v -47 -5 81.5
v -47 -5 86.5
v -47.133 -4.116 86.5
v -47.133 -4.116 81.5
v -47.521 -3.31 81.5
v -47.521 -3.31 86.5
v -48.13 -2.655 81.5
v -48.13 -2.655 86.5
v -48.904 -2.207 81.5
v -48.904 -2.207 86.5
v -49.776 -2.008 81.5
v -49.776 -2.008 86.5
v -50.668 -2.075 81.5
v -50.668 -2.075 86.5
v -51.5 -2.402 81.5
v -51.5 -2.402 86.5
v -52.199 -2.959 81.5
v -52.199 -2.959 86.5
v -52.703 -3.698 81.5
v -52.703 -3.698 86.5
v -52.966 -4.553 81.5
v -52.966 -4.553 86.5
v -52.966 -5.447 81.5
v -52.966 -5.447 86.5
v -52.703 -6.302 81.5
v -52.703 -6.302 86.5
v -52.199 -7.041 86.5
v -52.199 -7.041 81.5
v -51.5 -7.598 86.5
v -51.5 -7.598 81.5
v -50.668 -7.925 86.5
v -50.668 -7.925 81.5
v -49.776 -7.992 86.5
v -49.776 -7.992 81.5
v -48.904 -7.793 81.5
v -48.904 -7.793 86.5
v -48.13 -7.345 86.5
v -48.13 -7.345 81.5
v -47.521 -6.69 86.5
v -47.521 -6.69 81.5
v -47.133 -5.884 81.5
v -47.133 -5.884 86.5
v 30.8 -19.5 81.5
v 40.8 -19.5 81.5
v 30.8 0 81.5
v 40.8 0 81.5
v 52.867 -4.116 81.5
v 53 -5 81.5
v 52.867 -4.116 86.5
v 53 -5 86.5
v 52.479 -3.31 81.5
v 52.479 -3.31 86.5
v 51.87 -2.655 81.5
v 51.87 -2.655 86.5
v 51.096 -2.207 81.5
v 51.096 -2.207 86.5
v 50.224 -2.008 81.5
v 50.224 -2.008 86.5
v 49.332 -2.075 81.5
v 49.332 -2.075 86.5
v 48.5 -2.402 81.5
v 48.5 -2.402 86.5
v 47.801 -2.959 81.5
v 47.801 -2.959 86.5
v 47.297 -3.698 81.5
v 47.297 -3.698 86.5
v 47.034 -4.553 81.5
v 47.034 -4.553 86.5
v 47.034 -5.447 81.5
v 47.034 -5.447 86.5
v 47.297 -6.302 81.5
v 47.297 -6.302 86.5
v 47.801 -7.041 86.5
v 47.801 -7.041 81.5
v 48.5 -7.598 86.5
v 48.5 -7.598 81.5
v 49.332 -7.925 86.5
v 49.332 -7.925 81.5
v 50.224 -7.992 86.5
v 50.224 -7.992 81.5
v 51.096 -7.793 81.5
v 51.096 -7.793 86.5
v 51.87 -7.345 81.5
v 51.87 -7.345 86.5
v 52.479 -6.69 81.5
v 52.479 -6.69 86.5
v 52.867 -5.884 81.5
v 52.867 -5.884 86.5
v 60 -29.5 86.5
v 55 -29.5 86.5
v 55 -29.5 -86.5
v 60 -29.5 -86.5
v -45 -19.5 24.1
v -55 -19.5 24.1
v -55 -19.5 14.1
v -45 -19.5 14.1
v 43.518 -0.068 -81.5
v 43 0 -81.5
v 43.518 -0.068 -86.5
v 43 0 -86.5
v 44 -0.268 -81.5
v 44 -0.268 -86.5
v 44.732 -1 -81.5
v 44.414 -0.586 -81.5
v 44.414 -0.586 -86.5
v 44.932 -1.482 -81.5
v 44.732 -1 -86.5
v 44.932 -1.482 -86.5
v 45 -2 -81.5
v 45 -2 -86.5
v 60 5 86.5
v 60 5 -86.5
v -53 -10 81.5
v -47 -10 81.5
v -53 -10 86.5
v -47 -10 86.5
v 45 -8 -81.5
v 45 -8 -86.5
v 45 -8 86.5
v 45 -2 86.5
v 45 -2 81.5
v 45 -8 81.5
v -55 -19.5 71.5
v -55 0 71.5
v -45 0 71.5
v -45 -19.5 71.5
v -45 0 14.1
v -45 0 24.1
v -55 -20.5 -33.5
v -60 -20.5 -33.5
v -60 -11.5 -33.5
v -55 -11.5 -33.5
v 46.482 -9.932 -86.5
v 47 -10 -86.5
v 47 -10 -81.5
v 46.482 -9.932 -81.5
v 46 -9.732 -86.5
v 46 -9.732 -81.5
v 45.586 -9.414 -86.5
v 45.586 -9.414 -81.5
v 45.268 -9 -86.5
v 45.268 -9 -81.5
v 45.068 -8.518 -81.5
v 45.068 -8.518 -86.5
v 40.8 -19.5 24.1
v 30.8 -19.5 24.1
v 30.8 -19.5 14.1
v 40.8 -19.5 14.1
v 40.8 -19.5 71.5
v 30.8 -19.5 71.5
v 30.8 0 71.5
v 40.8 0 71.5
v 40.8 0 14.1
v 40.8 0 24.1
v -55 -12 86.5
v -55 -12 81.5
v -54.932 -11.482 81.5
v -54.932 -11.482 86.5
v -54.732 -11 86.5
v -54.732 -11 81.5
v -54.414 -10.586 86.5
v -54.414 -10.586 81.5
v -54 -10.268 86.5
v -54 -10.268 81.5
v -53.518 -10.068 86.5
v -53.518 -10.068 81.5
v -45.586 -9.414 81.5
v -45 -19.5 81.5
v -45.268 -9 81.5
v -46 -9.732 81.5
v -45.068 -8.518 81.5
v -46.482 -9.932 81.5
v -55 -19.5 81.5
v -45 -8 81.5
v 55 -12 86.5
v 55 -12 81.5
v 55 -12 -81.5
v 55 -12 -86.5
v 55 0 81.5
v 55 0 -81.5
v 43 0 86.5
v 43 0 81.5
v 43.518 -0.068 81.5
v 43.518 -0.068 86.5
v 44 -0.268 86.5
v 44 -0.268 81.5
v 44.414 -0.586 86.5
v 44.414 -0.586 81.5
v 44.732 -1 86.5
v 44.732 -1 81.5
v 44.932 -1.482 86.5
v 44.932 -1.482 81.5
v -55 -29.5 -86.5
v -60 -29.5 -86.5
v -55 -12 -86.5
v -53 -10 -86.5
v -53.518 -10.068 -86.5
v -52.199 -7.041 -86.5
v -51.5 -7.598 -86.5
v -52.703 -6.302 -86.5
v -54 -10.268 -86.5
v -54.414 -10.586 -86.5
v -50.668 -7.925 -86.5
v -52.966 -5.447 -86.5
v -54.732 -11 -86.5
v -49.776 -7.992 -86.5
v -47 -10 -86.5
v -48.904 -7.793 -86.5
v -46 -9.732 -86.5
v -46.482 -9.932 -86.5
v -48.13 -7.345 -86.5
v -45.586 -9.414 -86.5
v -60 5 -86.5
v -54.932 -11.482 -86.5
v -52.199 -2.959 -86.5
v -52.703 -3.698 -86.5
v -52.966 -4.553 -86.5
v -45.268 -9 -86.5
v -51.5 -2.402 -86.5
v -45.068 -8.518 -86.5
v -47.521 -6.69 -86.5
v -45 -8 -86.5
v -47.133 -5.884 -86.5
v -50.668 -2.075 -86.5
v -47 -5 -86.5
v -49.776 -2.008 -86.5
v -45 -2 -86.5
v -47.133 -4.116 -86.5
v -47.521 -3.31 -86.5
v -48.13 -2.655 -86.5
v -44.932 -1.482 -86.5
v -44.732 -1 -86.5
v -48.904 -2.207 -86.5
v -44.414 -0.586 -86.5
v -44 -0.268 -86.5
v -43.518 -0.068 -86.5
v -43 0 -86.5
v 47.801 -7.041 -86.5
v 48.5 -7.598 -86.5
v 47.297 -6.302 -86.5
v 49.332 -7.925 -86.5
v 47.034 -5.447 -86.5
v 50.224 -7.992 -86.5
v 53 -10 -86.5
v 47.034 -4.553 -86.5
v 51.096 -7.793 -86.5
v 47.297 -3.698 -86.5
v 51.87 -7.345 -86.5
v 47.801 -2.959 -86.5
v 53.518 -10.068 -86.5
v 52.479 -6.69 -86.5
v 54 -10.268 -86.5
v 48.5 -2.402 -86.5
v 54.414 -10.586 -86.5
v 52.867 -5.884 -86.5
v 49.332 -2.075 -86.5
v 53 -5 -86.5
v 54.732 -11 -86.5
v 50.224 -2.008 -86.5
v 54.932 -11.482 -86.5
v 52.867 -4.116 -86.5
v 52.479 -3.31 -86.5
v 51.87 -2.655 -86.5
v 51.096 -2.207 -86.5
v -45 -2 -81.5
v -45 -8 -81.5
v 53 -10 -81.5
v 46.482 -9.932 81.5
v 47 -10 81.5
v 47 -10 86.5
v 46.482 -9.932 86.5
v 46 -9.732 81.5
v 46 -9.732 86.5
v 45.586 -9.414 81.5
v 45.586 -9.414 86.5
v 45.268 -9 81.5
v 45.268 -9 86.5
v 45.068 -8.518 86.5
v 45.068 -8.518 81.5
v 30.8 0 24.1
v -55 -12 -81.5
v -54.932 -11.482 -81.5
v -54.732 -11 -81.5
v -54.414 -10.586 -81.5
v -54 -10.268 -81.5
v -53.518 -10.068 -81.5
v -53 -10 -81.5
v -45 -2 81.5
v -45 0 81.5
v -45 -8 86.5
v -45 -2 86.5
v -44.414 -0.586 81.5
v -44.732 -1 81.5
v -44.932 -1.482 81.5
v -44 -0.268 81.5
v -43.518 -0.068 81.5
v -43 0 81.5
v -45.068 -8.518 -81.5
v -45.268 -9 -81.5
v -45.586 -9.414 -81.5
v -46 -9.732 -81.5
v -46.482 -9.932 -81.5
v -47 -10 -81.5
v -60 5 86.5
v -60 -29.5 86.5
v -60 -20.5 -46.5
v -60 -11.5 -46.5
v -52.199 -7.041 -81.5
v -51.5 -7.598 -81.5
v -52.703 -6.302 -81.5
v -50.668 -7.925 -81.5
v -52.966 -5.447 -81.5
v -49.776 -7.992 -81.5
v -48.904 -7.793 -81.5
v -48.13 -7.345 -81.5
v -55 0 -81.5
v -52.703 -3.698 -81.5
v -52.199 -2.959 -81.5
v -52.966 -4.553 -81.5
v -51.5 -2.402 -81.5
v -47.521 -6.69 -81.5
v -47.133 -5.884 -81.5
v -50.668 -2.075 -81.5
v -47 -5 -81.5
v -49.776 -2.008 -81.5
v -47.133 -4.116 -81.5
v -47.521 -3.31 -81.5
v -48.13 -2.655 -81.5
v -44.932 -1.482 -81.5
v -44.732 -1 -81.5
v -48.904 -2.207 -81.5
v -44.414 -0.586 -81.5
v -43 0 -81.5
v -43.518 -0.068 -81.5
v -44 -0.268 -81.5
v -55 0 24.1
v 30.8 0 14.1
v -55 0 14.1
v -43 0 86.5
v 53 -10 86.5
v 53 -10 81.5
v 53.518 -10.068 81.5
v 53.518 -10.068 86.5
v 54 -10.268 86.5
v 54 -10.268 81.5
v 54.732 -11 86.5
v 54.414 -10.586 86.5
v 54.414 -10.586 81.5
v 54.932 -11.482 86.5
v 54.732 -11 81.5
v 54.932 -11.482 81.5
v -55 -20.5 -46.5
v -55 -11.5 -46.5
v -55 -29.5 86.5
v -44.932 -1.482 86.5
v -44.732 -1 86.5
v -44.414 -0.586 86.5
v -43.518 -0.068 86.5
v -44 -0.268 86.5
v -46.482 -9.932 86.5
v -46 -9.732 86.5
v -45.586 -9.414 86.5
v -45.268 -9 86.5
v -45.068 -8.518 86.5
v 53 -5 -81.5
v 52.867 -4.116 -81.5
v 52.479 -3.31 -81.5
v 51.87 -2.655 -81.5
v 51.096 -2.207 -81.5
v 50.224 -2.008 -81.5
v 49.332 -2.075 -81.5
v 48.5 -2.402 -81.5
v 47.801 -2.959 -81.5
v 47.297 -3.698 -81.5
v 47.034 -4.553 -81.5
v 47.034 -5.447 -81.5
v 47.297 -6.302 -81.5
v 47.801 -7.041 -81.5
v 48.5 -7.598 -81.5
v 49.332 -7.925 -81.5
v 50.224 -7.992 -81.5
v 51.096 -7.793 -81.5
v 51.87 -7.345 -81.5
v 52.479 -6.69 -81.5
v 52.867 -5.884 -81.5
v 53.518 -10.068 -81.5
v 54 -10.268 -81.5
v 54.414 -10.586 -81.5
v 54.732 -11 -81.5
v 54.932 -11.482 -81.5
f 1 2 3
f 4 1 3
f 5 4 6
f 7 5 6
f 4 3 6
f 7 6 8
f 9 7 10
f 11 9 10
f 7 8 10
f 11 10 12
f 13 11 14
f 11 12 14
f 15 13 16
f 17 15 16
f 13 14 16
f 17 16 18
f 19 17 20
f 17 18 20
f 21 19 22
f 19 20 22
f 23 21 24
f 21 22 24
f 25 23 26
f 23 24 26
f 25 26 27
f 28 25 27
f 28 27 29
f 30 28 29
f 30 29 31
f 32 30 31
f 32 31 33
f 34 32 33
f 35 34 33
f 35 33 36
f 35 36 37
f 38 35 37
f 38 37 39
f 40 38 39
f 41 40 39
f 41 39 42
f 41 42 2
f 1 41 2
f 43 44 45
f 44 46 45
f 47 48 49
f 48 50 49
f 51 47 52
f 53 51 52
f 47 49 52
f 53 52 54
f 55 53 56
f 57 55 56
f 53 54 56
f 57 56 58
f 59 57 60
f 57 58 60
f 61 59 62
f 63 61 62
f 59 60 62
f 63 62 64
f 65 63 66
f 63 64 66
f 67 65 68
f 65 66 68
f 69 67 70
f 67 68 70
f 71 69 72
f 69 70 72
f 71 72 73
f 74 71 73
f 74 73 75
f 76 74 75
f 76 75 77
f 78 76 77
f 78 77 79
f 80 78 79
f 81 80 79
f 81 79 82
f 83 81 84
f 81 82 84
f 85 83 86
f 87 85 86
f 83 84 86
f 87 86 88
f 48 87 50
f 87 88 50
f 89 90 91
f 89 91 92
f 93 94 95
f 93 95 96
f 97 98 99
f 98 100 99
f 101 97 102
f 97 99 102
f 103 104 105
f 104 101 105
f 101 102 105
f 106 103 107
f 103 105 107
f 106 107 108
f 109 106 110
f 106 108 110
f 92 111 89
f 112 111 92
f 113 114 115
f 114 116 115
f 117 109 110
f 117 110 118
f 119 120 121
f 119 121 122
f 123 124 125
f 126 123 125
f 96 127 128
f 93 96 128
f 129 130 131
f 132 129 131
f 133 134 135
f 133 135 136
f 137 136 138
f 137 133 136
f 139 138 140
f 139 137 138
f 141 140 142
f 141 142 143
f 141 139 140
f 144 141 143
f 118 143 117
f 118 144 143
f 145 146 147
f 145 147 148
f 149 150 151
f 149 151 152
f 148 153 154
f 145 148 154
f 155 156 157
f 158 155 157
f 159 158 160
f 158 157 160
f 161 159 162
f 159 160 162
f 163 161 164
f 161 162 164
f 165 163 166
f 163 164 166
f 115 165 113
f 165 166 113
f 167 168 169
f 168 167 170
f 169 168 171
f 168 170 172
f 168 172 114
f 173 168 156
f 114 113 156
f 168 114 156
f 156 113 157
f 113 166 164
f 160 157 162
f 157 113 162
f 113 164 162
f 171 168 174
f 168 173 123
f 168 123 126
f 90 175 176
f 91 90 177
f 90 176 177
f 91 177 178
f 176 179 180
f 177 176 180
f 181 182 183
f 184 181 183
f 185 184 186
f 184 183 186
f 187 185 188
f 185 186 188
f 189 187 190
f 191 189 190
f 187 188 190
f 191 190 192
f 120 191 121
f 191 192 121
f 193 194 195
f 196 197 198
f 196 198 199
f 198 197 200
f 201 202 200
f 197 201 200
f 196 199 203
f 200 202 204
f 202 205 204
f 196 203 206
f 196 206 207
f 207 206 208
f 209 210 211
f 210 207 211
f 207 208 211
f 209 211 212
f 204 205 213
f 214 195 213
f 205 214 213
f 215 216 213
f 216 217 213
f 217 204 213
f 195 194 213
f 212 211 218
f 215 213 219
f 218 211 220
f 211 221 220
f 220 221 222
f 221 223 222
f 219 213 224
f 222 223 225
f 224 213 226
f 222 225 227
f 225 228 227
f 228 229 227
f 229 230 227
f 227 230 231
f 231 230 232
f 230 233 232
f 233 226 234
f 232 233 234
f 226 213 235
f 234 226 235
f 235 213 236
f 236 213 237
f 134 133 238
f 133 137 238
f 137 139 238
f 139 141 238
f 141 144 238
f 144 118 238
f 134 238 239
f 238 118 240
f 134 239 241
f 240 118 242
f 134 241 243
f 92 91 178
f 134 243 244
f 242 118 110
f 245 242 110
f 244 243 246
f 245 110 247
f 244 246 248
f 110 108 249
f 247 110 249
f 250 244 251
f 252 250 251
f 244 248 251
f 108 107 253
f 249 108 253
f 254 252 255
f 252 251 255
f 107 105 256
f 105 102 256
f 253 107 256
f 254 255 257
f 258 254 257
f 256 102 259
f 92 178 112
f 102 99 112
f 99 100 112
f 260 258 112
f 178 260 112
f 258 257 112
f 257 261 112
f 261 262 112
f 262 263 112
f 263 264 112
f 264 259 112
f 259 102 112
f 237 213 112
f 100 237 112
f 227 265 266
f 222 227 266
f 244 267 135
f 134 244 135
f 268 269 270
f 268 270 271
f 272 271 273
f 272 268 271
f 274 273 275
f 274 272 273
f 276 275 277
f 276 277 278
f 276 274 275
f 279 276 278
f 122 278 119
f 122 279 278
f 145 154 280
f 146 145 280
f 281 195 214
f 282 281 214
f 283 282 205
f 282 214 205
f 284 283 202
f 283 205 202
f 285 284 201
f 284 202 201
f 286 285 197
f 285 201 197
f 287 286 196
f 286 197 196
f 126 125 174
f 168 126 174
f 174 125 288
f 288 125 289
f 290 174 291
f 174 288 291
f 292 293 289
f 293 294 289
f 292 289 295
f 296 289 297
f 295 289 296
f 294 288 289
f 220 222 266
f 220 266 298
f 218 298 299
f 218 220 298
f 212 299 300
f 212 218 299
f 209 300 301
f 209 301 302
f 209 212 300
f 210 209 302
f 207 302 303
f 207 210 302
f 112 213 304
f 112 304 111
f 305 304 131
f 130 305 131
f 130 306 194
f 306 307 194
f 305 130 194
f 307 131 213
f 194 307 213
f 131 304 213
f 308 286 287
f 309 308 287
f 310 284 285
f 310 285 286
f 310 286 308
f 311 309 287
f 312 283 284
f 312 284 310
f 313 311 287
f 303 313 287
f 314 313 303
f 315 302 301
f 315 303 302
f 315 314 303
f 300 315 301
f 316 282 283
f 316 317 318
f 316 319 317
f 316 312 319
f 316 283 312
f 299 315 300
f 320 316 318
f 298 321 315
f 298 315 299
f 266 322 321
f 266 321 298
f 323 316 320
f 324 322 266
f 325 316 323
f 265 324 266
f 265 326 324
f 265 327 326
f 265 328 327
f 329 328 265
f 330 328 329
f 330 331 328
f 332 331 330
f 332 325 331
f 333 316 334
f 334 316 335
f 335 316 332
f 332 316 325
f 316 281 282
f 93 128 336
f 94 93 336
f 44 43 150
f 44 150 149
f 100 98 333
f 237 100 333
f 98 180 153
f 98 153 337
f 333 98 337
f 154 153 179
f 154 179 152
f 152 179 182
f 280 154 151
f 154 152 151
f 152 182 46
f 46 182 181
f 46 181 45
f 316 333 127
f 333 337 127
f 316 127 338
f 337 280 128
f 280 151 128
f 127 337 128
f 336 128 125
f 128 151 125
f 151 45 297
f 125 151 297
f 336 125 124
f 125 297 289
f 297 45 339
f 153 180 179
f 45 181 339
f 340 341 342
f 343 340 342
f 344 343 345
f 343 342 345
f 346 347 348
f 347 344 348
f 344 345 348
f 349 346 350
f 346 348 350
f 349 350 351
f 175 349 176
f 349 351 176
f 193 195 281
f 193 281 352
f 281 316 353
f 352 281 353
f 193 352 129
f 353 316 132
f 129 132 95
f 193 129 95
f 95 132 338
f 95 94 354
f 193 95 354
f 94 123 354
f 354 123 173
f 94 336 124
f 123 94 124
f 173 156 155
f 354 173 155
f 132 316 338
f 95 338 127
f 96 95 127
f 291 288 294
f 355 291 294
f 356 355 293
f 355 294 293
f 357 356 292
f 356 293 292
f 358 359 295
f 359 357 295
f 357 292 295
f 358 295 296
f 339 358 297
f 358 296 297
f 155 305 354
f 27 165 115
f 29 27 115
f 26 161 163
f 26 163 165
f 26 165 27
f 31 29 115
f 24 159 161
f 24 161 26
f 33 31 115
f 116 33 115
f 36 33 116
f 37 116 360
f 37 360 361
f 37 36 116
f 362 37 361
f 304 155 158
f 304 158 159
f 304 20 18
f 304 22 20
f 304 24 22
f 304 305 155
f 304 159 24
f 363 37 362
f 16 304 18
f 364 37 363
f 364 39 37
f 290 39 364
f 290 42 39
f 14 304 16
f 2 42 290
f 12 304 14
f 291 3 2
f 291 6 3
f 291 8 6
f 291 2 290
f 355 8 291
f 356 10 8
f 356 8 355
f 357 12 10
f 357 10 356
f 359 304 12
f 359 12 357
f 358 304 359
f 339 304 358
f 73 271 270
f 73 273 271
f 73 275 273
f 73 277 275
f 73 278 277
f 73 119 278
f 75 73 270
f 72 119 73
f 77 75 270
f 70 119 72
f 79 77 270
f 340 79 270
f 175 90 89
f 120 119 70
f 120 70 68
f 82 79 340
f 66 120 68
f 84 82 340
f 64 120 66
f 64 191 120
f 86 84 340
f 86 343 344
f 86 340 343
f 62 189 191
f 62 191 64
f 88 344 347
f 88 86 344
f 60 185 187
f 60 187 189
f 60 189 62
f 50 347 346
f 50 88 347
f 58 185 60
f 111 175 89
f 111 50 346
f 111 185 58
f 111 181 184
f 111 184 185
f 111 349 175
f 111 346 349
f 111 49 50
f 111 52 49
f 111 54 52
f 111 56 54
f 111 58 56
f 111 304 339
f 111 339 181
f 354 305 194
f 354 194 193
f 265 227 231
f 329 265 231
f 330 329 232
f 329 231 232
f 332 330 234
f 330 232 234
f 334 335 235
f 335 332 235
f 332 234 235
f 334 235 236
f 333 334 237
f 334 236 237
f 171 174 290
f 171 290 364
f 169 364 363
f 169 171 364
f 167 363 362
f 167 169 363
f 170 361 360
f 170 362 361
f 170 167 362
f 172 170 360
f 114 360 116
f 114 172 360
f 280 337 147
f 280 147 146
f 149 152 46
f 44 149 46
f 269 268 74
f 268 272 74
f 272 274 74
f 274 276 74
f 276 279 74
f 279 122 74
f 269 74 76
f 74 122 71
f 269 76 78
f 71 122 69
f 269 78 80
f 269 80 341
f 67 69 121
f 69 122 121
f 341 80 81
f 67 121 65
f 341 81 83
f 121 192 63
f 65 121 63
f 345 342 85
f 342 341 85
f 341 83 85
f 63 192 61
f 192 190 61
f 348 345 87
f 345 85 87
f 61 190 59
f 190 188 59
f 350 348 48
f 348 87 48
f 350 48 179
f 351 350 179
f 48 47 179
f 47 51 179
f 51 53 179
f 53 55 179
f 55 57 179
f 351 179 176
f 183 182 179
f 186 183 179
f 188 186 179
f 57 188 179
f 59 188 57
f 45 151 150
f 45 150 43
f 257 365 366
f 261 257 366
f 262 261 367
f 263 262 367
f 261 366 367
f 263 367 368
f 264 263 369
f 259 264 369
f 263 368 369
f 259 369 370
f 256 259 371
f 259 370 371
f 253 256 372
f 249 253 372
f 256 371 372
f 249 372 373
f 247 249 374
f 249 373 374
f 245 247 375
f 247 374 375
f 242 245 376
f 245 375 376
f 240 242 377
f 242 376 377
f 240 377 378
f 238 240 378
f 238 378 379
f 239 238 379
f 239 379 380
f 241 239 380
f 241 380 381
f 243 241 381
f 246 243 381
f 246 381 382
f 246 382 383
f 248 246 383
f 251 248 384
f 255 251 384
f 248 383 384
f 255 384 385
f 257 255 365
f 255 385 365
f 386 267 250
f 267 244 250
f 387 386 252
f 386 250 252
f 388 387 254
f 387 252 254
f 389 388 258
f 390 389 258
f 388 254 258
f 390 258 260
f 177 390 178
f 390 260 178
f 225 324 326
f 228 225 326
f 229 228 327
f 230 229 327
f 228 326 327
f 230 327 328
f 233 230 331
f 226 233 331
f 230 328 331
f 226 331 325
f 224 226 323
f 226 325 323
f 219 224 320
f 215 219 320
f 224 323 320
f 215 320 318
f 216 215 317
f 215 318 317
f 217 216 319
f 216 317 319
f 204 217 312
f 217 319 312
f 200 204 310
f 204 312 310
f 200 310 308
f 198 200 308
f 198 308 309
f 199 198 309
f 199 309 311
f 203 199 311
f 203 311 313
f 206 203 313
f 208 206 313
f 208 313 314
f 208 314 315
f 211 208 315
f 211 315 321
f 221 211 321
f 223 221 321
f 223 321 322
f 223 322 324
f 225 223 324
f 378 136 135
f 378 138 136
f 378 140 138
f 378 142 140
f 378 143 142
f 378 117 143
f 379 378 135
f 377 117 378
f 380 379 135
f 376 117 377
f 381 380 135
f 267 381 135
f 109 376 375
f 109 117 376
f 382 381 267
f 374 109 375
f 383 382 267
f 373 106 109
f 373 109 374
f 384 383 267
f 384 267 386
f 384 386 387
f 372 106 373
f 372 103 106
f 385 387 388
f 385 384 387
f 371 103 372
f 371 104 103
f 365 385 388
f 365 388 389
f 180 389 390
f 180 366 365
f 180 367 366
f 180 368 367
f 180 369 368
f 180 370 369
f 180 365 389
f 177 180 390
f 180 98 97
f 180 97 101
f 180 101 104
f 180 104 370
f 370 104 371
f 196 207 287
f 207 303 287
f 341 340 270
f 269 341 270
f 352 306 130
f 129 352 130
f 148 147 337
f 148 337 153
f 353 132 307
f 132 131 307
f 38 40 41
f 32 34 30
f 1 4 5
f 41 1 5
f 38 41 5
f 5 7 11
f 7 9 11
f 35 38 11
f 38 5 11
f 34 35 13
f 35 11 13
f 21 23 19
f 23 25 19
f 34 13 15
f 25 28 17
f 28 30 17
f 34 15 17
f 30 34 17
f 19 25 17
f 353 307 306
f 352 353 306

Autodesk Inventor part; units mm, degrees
ref_plane "YZ Plane" through (0, 0, 0) normal (1, 0, 0) x (0, 1, 0)
ref_plane "XZ Plane" through (0, 0, 0) normal (0, 1, 0) x (-1, 0, 0)
ref_plane "XY Plane" through (0, 0, 0) normal (0, 0, 1) x (1, 0, 0)
sketch "Sketch1" plane through (0, 0, 0) normal (0, 1, 0) x (-1, 0, 0)
  line L0 (55, -86.5) -> (-55, -86.5)
  line L1 (-55, -86.5) -> (-55, 86.5)
  line L2 (-55, 86.5) -> (55, 86.5)
  line L3 (55, 86.5) -> (55, -86.5)
  line L4 (55, -86.5) -> (-55, 86.5) construction
  line L5 (-55, -86.5) -> (55, 86.5) construction
  point P0 (0, 0)
  dimension "d0" = 110
  dimension "d1" = 173
extrude "Extrusion1" add sketch "Sketch1" along normal blind 5
sketch "Sketch2" plane through (0, 5, 0) normal (0, 1, 0) x (1, 0, 0)
  line L0 (-55, -86.5) -> (55, -86.5) projected
  line L1 (-55, -86.5) -> (-60, -86.5)
  line L2 (-60, -86.5) -> (-60, 86.5)
  line L3 (-60, 86.5) -> (-55, 86.5)
  line L4 (-55, 86.5) -> (-55, -86.5)
  point P0 (0, 0)
  dimension "d4" = 5
extrude "Extrusion2" add sketch "Sketch2" against normal blind 34.5
sketch "Sketch3" plane through (0, 5, 0) normal (0, 1, 0) x (1, 0, 0)
  line L0 (55, -86.5) -> (55, 86.5) projected
  line L1 (55, -86.5) -> (60, -86.5)
  line L2 (60, -86.5) -> (60, 86.5)
  line L3 (60, 86.5) -> (55, 86.5)
  line L4 (55, 86.5) -> (55, -86.5)
  point P0 (0, 0)
  dimension "d7" = 5
extrude "Extrusion3" add sketch "Sketch3" against normal blind 34.5
sketch "Sketch4" plane through (-60, -29.5, 86.5) normal (0, 0, 1) x (1, 0, 0)
  line L0 (5, 29.5) -> (5, 0) projected
  line L1 (5, 29.5) -> (15, 29.5)
  line L2 (15, 29.5) -> (15, 19.5)
  line L3 (15, 19.5) -> (5, 19.5)
  line L4 (5, 19.5) -> (5, 29.5)
  circle A0 centre (10, 24.5) radius 3
  point P0 (60, 29.5)
  point P1 (5, 19.5)
  dimension "d10" = 10
  dimension "d11" = 10
  dimension "d23" = 5
  dimension "d24" = 5
  dimension "d26" = 6
extrude "Extrusion4" add sketch "Sketch4" against normal blind 5
pattern_linear "Rectangular Pattern1" count 2 spacing 100 along (1, 0, 0) count 2 spacing 168 along (0, 0, -1) of "Extrusion4"
fillet "Fillet3" radius 2 12 edges at (-55, -10, 84) (-45, -10, 84) (-45, 0, 84) (45, -10, 84) (55, -10, 84) (45, 0, 84) (45, -10, -84) (55, -10, -84) (45, 0, -84) (-55, -10, -84) (-45, -10, -84) (-45, 0, -84)
sketch "Sketch7" plane through (-60, 5, -86.5) normal (-1, 0, 0) x (0, 0, 1)
  line L0 (53, -16.5) -> (40, -16.5)
  line L1 (40, -16.5) -> (40, -25.5)
  line L2 (40, -25.5) -> (53, -25.5)
  line L3 (53, -25.5) -> (53, -16.5)
  line L4 (53, -16.5) -> (40, -25.5) construction
  line L5 (40, -16.5) -> (53, -25.5) construction
  line L6 (0, 0) -> (0, -34.5) projected
  line L7 (173, -34.5) -> (0, -34.5) projected
  point P0 (86.5, -5)
  point P1 (46.5, -21)
  dimension "d33" = 9
  dimension "d34" = 13
  dimension "d35" = 40
extrude "Extrusion6" cut sketch "Sketch7" against normal blind 5
sketch "Sketch8" plane through (0, 0, 0) normal (0, -1, 0) x (1, 0, 0)
  circle A0 centre (-50, 76.5) radius 1.25
  line L0 (-47, 81.5) -> (-53, 81.5) projected
  line L1 (-55, -86.5) -> (-55, 86.5) projected
  line L2 (-55, 71.5) -> (-45, 71.5)
  line L3 (-45, 71.5) -> (-45, 81.5)
  line L4 (-45, 81.5) -> (-55, 81.5)
  line L5 (-55, 81.5) -> (-55, 71.5)
  line L6 (-55, 71.5) -> (-45, 81.5) construction
  line L7 (-45, 71.5) -> (-55, 81.5) construction
  point P0 (0, 0)
  dimension "d39" = 2.5
  dimension "d40" = 5
  dimension "d41" = 5
  dimension "d42" = 10
  dimension "d43" = 10
extrude "Extrusion7" add sketch "Sketch8" along normal blind 19.5 contours A0 | L4 L3 L2 L1 L0
pattern_linear "Rectangular Pattern2" count 2 spacing 85.8 along (1, 0, 0) count 2 spacing 57.4 along (0, 0, -1) of "Extrusion7"
properties part number "Caja1"
